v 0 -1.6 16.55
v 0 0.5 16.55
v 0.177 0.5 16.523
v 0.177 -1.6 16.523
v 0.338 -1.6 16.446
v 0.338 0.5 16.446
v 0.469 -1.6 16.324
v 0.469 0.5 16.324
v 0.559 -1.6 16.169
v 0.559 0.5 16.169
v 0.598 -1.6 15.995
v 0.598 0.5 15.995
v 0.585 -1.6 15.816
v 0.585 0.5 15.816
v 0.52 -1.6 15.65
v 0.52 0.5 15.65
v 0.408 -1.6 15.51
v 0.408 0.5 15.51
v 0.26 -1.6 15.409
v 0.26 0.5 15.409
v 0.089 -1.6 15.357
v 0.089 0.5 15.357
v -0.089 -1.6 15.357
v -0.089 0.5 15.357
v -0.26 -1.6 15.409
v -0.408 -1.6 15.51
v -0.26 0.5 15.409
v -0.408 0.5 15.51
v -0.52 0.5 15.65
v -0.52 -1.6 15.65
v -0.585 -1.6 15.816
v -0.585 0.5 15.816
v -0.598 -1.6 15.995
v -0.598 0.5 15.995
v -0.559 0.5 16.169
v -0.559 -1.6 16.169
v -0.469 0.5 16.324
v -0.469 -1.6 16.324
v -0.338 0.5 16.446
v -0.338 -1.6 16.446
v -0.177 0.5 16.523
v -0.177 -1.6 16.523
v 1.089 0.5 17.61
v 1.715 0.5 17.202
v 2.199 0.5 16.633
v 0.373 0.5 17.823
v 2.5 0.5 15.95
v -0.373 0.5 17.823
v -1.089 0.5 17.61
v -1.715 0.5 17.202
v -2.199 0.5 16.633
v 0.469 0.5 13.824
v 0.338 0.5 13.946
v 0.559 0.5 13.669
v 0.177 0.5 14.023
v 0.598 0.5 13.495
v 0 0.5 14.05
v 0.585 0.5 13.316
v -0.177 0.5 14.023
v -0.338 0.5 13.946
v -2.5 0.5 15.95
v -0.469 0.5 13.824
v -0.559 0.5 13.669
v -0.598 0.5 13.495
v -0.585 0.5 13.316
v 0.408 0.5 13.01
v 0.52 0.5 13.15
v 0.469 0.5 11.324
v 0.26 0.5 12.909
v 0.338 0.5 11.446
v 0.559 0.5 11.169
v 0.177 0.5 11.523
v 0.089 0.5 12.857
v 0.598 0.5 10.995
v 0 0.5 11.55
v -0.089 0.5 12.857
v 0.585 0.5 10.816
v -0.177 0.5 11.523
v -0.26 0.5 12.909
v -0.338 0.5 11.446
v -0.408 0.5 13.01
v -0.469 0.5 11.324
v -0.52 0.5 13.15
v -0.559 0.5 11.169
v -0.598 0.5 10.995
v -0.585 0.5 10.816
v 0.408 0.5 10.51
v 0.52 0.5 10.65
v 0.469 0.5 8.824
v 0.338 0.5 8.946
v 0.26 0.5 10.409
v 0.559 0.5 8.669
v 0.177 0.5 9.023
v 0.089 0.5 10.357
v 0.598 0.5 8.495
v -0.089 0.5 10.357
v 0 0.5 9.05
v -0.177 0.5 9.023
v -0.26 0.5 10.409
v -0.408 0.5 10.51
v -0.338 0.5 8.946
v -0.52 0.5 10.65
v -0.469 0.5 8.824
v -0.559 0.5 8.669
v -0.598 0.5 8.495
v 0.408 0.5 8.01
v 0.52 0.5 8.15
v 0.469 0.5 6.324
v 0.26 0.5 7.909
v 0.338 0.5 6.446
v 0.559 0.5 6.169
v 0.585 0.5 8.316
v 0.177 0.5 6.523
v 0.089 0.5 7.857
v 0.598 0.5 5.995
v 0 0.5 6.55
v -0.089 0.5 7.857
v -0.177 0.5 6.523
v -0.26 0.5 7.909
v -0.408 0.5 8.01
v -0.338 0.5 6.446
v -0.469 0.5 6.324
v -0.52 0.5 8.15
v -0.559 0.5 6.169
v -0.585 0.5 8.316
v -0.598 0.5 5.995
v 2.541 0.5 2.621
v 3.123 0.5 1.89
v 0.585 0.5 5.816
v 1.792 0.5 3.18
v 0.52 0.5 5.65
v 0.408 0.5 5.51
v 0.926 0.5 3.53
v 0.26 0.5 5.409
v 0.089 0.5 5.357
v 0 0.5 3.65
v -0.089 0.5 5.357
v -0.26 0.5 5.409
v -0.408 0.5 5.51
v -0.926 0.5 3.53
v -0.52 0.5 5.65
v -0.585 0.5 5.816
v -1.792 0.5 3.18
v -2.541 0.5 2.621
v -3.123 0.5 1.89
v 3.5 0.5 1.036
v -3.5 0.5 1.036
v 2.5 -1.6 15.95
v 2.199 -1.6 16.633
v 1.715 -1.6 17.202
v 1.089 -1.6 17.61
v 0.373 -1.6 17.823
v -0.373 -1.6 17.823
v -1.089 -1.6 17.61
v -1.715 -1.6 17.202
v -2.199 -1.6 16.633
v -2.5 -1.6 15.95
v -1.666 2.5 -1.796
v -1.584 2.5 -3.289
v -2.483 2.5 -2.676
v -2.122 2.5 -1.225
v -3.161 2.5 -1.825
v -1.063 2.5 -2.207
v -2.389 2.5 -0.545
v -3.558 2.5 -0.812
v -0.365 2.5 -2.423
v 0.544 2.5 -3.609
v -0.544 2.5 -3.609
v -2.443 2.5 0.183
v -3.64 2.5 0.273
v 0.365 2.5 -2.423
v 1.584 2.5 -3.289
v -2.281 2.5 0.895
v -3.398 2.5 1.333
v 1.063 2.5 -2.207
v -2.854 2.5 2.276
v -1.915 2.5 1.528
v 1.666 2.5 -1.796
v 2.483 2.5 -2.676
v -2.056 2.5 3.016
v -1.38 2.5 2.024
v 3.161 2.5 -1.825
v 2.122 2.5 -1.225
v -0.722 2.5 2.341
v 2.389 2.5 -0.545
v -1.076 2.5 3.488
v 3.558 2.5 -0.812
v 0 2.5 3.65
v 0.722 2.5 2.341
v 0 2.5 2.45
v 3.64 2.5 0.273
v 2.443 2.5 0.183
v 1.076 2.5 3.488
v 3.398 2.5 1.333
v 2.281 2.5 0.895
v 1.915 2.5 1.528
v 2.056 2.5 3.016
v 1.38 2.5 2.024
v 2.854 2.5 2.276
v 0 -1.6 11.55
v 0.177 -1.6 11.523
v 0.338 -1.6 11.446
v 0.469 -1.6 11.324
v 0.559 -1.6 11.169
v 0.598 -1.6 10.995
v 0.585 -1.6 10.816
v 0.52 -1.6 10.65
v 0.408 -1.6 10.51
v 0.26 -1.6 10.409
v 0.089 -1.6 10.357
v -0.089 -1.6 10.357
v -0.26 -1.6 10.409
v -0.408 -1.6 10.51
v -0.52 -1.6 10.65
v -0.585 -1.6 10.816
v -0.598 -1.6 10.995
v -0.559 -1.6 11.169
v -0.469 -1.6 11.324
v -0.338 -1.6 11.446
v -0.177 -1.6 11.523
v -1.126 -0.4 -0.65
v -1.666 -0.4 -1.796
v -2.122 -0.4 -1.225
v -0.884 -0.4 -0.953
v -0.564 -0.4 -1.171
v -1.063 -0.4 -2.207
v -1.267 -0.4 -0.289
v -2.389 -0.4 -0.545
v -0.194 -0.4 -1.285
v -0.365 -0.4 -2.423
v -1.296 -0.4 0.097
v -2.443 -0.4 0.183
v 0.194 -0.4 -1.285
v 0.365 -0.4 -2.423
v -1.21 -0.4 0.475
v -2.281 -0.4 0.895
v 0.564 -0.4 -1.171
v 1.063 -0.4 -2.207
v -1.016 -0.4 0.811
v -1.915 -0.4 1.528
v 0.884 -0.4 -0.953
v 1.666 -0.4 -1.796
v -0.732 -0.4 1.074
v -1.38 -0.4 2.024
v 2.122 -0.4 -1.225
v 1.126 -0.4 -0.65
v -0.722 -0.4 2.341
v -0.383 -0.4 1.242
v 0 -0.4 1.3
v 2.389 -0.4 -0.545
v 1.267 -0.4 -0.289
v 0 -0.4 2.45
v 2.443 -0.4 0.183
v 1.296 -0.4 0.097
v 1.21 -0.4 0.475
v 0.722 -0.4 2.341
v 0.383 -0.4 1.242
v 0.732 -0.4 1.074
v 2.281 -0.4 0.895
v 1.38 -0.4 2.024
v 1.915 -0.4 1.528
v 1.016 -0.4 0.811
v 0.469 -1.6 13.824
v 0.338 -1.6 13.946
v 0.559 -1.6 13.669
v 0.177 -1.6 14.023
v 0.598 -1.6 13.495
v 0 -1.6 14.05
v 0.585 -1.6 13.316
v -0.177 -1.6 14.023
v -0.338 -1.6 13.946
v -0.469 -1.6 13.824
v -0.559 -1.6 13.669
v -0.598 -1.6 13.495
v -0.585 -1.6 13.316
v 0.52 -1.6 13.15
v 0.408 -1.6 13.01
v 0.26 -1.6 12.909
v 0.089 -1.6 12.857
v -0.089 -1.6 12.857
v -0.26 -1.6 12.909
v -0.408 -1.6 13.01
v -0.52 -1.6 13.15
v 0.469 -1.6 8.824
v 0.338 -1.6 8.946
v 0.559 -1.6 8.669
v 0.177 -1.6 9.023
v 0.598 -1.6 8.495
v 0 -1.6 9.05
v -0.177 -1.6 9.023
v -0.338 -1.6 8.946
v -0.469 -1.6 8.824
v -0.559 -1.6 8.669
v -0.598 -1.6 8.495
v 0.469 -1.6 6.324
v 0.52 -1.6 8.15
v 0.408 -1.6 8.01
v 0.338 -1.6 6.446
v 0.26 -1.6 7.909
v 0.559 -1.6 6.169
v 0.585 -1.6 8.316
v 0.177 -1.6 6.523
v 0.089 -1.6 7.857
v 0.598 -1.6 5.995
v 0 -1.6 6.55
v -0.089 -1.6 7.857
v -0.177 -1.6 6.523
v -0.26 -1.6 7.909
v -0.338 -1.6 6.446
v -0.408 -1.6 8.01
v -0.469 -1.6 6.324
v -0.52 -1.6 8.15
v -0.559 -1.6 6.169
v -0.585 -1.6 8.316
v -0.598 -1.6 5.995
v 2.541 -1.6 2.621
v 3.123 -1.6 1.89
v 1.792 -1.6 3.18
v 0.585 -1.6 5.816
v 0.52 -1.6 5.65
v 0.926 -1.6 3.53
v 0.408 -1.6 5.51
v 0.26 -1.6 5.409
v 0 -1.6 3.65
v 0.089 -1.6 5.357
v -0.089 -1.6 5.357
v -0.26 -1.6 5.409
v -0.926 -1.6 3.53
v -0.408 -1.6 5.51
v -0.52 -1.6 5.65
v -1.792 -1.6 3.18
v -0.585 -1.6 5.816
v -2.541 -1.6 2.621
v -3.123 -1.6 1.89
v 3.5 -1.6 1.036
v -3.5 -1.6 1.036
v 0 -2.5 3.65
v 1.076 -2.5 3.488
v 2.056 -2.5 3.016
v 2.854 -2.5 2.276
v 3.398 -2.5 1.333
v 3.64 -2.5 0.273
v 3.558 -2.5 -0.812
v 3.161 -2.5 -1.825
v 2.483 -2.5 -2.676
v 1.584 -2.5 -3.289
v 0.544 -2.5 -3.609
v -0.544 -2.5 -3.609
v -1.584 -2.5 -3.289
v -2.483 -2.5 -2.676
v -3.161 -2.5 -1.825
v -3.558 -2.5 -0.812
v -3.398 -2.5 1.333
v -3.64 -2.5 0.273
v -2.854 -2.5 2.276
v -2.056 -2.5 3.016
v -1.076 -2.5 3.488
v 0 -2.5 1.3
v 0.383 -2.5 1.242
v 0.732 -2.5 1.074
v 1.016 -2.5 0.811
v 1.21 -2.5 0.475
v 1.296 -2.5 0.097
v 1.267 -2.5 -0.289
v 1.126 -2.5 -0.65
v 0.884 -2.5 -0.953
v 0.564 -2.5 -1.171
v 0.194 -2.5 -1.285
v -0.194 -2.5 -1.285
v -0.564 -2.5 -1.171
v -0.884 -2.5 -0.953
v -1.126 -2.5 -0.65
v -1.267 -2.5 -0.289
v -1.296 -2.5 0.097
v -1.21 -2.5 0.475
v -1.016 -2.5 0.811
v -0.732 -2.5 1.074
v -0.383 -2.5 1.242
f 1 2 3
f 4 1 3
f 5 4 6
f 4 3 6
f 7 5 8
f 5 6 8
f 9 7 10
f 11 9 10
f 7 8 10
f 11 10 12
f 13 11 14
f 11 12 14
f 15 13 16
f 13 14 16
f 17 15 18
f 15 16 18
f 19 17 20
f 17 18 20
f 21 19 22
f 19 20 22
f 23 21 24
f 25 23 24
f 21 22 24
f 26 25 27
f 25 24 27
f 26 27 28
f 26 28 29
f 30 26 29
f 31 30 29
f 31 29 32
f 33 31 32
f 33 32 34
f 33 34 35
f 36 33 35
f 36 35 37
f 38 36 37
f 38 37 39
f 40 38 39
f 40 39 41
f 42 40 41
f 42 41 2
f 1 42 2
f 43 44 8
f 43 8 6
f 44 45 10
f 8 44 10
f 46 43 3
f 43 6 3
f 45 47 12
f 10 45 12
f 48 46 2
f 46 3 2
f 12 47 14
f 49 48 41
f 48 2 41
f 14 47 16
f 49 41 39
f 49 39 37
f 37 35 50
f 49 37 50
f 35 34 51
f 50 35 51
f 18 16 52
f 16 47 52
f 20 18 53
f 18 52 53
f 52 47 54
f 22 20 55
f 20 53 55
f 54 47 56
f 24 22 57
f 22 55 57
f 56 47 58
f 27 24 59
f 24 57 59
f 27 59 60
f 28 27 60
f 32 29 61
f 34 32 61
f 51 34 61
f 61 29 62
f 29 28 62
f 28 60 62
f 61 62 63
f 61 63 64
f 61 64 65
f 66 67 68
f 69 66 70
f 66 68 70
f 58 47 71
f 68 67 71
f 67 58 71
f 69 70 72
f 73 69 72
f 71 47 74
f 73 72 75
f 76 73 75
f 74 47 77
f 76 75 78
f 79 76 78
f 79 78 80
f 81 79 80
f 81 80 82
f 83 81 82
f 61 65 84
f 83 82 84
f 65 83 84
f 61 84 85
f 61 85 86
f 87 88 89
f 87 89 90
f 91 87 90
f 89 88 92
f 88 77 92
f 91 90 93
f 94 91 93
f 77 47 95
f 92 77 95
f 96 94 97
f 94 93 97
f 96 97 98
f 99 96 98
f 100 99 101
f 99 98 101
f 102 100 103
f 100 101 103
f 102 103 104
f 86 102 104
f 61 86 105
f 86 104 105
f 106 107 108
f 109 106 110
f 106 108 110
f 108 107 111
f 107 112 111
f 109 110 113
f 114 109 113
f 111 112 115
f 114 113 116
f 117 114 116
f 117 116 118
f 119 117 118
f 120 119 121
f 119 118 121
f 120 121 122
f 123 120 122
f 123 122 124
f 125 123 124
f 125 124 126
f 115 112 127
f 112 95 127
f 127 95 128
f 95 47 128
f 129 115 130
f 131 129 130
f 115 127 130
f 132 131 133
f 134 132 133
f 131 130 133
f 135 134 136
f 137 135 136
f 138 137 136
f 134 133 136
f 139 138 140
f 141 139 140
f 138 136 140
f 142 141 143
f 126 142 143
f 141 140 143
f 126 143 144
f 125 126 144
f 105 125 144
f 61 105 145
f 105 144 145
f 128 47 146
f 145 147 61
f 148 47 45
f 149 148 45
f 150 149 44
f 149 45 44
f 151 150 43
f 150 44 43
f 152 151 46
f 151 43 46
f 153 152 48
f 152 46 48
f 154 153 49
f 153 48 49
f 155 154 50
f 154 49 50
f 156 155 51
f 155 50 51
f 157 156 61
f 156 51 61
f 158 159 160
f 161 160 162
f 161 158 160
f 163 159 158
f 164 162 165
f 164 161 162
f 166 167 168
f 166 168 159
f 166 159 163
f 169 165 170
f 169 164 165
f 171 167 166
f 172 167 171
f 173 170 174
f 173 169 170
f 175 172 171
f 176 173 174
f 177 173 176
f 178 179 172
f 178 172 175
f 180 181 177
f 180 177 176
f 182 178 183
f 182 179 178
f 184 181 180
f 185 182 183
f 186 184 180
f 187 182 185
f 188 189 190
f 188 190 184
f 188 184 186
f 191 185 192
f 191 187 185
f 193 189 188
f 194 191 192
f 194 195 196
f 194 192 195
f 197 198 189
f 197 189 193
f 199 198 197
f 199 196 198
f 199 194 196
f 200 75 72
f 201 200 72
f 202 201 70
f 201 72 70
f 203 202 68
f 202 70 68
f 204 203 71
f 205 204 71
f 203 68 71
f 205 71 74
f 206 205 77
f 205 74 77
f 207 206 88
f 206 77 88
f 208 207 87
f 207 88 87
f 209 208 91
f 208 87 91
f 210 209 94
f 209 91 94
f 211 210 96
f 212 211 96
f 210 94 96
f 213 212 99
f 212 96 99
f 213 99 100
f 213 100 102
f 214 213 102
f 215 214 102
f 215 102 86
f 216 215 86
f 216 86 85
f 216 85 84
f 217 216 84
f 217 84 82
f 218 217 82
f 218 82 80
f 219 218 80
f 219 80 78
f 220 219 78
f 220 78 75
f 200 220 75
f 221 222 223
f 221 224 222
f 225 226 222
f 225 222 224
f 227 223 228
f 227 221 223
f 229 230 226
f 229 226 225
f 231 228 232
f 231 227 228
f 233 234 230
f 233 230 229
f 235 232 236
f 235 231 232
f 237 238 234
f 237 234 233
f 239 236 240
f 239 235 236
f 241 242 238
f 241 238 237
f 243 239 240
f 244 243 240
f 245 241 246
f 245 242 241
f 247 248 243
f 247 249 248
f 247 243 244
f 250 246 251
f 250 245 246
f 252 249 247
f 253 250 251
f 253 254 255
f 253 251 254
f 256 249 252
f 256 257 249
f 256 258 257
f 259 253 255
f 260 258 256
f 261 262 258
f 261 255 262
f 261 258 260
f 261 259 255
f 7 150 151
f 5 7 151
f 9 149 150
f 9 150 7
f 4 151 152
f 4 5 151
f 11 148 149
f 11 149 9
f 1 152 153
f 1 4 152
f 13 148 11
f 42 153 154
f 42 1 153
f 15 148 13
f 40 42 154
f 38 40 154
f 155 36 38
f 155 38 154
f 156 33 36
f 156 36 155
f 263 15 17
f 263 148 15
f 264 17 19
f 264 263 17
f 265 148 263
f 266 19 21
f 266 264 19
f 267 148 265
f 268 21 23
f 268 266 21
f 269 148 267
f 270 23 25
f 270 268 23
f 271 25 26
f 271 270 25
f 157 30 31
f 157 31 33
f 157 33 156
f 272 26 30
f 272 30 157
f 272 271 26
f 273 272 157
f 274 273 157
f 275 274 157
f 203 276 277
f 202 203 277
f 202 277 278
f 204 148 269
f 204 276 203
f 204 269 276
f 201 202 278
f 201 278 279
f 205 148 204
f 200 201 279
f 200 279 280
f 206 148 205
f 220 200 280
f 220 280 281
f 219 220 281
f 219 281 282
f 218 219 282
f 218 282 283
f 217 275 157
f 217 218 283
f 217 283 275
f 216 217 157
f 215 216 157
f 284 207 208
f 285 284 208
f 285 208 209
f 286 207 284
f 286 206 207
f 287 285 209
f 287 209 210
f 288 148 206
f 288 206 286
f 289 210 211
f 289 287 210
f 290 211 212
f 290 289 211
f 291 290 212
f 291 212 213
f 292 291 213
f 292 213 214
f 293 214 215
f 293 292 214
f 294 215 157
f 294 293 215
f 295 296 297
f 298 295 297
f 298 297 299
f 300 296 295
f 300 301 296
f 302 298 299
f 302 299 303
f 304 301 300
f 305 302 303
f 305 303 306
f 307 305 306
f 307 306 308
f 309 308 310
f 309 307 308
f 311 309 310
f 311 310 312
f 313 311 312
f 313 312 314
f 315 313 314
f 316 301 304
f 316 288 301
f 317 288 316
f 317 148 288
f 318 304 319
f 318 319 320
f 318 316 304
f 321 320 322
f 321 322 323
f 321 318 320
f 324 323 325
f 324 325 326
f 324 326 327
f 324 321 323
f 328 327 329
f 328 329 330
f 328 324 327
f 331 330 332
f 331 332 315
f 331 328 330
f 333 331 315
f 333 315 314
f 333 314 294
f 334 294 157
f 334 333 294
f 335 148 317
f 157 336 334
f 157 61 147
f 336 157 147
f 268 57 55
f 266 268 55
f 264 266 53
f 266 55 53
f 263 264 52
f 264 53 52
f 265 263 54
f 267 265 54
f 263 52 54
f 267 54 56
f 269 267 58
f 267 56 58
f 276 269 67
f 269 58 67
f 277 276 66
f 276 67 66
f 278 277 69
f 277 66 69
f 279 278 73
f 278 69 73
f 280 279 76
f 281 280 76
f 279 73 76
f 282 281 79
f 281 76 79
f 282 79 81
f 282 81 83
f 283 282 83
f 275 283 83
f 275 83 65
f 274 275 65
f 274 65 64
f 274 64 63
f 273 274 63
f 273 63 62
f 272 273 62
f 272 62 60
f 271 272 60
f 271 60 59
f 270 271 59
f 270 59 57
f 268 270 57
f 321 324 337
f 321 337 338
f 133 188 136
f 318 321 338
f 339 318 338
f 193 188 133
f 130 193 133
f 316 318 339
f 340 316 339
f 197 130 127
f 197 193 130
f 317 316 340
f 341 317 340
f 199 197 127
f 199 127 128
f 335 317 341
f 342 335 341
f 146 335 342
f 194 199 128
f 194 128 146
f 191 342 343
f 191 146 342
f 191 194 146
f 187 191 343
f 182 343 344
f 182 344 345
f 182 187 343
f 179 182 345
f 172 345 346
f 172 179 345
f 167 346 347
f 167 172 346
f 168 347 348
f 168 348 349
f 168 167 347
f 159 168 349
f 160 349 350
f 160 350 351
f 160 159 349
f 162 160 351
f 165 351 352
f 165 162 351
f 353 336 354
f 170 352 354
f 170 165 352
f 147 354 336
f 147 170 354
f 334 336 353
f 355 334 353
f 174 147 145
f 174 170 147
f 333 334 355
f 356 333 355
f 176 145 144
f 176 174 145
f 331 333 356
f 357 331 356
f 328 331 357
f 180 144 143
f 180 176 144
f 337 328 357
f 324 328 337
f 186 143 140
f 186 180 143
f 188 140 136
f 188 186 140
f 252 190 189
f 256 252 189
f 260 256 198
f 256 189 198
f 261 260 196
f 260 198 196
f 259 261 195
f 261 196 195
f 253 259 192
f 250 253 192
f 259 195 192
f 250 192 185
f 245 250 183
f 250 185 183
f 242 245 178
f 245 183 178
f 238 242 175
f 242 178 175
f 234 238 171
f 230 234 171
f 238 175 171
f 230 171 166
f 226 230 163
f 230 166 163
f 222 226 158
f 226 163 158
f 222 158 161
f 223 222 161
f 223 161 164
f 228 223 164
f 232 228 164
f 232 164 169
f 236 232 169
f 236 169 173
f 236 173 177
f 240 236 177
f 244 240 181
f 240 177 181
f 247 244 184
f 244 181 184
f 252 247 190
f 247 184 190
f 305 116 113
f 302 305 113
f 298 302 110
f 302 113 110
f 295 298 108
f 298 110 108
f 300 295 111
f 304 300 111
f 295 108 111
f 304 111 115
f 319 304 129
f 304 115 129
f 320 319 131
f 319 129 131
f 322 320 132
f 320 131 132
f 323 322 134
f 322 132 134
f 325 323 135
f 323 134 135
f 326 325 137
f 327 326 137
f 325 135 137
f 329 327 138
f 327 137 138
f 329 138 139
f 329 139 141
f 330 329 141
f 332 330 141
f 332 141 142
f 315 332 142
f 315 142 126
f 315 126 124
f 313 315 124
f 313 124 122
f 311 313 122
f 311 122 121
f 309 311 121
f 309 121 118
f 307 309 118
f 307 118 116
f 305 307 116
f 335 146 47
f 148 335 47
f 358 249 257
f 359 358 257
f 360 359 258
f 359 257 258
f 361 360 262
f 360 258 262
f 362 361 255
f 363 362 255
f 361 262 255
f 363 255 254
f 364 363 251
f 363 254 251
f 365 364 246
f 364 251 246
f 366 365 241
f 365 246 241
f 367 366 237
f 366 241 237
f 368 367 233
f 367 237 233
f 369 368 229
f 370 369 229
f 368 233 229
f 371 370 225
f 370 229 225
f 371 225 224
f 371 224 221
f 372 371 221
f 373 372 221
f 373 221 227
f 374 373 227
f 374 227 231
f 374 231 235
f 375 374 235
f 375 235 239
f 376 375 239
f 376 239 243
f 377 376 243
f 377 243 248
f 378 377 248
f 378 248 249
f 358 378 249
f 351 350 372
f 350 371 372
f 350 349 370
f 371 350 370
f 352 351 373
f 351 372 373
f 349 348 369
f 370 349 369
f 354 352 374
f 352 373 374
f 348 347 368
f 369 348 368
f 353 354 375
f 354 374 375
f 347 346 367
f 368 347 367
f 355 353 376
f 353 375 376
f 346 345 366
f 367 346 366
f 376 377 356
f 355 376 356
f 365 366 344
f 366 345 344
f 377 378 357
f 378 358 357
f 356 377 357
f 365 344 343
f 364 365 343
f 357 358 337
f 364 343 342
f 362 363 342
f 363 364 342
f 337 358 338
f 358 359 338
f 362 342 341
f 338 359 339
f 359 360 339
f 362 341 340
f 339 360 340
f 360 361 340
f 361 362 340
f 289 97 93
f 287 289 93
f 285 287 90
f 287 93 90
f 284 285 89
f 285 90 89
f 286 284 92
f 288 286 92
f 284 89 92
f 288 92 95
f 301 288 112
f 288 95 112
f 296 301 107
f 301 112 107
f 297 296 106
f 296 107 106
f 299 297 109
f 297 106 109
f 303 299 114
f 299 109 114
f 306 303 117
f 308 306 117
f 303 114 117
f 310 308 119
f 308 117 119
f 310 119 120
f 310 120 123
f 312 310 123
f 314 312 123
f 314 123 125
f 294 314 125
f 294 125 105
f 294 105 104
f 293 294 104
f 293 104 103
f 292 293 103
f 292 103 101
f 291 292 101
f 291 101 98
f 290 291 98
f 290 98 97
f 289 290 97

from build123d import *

# Parameters (mm, degrees)
SKETCH_3_R          = 3.65
EXTRUDE_1_DEPTH     = 2.5
SKETCH_4_R          = 2.45
CUT_EXTRUDE_1_DEPTH = 2.9
SKETCH_5_R          = 1.3
CUT_EXTRUDE_2_DEPTH = 6.920726307
EXTRUDE_2_DEPTH     = 2.1
SKETCH_7_R          = 0.6
CUT_EXTRUDE_3_DEPTH = 10


with BuildPart() as part:
    # 草图3 → 凸台-拉伸1 (new, symmetric)
    with BuildSketch(Plane(origin=(0, 0, 0), x_dir=(1, 0, 0), z_dir=(0, 1, 0))):
        with Locations(Location((0, 0, 0), (0, 0, 270))):
            Circle(SKETCH_3_R)
    extrude(amount=EXTRUDE_1_DEPTH, both=True)

    # 草图4 → 切除-拉伸1 (cut)
    with BuildSketch(Plane(origin=(0, 2.5, 0), x_dir=(1, 0, 0), z_dir=(0, 1, 0))):
        with Locations(Location((0, 0, 0), (0, 0, 270))):
            Circle(SKETCH_4_R)
    extrude(amount=-CUT_EXTRUDE_1_DEPTH, mode=Mode.SUBTRACT)

    # 草图5 → 切除-拉伸2 (cut, through all)
    with BuildSketch(Plane(origin=(0, -0.4, 0), x_dir=(1, 0, 0), z_dir=(0, 1, 0))):
        with Locations(Location((0, 0, 0), (0, 0, 270))):
            Circle(SKETCH_5_R)
    extrude(amount=-CUT_EXTRUDE_2_DEPTH, mode=Mode.SUBTRACT)

    # 草图6 → 凸台-拉伸2 (add)
    with BuildSketch(Plane(origin=(0, 0.5, 0), x_dir=(1, 0, 0), z_dir=(0, 1, 0))):
        with BuildLine():
            Line((3.5, -1.035615759), (2.5, -15.95))
            ThreePointArc((2.5, -15.95), (0, -17.85), (-2.5, -15.95))
            Line((-2.5, -15.95), (-3.5, -1.035615759))
            ThreePointArc((-3.5, -1.035615759), (0, -3.65), (3.5, -1.035615759))
        make_face()
    extrude(amount=-EXTRUDE_2_DEPTH)

    # 草图7 → 切除-拉伸3 (cut)
    with BuildSketch(Plane(origin=(0, 0.5, 0), x_dir=(1, 0, 0), z_dir=(0, 1, 0))):
        with Locations(Location((0, -15.95, 0), (0, 0, 270))):
            Circle(SKETCH_7_R)
        with Locations(Location((0, -13.45, 0), (0, 0, 270))):
            Circle(SKETCH_7_R)
        with Locations(Location((0, -10.95, 0), (0, 0, 270))):
            Circle(SKETCH_7_R)
        with Locations(Location((0, -8.45, 0), (0, 0, 270))):
            Circle(SKETCH_7_R)
        with Locations(Location((0, -5.95, 0), (0, 0, 270))):
            Circle(SKETCH_7_R)
    extrude(amount=-CUT_EXTRUDE_3_DEPTH, mode=Mode.SUBTRACT)


solid = part.part
